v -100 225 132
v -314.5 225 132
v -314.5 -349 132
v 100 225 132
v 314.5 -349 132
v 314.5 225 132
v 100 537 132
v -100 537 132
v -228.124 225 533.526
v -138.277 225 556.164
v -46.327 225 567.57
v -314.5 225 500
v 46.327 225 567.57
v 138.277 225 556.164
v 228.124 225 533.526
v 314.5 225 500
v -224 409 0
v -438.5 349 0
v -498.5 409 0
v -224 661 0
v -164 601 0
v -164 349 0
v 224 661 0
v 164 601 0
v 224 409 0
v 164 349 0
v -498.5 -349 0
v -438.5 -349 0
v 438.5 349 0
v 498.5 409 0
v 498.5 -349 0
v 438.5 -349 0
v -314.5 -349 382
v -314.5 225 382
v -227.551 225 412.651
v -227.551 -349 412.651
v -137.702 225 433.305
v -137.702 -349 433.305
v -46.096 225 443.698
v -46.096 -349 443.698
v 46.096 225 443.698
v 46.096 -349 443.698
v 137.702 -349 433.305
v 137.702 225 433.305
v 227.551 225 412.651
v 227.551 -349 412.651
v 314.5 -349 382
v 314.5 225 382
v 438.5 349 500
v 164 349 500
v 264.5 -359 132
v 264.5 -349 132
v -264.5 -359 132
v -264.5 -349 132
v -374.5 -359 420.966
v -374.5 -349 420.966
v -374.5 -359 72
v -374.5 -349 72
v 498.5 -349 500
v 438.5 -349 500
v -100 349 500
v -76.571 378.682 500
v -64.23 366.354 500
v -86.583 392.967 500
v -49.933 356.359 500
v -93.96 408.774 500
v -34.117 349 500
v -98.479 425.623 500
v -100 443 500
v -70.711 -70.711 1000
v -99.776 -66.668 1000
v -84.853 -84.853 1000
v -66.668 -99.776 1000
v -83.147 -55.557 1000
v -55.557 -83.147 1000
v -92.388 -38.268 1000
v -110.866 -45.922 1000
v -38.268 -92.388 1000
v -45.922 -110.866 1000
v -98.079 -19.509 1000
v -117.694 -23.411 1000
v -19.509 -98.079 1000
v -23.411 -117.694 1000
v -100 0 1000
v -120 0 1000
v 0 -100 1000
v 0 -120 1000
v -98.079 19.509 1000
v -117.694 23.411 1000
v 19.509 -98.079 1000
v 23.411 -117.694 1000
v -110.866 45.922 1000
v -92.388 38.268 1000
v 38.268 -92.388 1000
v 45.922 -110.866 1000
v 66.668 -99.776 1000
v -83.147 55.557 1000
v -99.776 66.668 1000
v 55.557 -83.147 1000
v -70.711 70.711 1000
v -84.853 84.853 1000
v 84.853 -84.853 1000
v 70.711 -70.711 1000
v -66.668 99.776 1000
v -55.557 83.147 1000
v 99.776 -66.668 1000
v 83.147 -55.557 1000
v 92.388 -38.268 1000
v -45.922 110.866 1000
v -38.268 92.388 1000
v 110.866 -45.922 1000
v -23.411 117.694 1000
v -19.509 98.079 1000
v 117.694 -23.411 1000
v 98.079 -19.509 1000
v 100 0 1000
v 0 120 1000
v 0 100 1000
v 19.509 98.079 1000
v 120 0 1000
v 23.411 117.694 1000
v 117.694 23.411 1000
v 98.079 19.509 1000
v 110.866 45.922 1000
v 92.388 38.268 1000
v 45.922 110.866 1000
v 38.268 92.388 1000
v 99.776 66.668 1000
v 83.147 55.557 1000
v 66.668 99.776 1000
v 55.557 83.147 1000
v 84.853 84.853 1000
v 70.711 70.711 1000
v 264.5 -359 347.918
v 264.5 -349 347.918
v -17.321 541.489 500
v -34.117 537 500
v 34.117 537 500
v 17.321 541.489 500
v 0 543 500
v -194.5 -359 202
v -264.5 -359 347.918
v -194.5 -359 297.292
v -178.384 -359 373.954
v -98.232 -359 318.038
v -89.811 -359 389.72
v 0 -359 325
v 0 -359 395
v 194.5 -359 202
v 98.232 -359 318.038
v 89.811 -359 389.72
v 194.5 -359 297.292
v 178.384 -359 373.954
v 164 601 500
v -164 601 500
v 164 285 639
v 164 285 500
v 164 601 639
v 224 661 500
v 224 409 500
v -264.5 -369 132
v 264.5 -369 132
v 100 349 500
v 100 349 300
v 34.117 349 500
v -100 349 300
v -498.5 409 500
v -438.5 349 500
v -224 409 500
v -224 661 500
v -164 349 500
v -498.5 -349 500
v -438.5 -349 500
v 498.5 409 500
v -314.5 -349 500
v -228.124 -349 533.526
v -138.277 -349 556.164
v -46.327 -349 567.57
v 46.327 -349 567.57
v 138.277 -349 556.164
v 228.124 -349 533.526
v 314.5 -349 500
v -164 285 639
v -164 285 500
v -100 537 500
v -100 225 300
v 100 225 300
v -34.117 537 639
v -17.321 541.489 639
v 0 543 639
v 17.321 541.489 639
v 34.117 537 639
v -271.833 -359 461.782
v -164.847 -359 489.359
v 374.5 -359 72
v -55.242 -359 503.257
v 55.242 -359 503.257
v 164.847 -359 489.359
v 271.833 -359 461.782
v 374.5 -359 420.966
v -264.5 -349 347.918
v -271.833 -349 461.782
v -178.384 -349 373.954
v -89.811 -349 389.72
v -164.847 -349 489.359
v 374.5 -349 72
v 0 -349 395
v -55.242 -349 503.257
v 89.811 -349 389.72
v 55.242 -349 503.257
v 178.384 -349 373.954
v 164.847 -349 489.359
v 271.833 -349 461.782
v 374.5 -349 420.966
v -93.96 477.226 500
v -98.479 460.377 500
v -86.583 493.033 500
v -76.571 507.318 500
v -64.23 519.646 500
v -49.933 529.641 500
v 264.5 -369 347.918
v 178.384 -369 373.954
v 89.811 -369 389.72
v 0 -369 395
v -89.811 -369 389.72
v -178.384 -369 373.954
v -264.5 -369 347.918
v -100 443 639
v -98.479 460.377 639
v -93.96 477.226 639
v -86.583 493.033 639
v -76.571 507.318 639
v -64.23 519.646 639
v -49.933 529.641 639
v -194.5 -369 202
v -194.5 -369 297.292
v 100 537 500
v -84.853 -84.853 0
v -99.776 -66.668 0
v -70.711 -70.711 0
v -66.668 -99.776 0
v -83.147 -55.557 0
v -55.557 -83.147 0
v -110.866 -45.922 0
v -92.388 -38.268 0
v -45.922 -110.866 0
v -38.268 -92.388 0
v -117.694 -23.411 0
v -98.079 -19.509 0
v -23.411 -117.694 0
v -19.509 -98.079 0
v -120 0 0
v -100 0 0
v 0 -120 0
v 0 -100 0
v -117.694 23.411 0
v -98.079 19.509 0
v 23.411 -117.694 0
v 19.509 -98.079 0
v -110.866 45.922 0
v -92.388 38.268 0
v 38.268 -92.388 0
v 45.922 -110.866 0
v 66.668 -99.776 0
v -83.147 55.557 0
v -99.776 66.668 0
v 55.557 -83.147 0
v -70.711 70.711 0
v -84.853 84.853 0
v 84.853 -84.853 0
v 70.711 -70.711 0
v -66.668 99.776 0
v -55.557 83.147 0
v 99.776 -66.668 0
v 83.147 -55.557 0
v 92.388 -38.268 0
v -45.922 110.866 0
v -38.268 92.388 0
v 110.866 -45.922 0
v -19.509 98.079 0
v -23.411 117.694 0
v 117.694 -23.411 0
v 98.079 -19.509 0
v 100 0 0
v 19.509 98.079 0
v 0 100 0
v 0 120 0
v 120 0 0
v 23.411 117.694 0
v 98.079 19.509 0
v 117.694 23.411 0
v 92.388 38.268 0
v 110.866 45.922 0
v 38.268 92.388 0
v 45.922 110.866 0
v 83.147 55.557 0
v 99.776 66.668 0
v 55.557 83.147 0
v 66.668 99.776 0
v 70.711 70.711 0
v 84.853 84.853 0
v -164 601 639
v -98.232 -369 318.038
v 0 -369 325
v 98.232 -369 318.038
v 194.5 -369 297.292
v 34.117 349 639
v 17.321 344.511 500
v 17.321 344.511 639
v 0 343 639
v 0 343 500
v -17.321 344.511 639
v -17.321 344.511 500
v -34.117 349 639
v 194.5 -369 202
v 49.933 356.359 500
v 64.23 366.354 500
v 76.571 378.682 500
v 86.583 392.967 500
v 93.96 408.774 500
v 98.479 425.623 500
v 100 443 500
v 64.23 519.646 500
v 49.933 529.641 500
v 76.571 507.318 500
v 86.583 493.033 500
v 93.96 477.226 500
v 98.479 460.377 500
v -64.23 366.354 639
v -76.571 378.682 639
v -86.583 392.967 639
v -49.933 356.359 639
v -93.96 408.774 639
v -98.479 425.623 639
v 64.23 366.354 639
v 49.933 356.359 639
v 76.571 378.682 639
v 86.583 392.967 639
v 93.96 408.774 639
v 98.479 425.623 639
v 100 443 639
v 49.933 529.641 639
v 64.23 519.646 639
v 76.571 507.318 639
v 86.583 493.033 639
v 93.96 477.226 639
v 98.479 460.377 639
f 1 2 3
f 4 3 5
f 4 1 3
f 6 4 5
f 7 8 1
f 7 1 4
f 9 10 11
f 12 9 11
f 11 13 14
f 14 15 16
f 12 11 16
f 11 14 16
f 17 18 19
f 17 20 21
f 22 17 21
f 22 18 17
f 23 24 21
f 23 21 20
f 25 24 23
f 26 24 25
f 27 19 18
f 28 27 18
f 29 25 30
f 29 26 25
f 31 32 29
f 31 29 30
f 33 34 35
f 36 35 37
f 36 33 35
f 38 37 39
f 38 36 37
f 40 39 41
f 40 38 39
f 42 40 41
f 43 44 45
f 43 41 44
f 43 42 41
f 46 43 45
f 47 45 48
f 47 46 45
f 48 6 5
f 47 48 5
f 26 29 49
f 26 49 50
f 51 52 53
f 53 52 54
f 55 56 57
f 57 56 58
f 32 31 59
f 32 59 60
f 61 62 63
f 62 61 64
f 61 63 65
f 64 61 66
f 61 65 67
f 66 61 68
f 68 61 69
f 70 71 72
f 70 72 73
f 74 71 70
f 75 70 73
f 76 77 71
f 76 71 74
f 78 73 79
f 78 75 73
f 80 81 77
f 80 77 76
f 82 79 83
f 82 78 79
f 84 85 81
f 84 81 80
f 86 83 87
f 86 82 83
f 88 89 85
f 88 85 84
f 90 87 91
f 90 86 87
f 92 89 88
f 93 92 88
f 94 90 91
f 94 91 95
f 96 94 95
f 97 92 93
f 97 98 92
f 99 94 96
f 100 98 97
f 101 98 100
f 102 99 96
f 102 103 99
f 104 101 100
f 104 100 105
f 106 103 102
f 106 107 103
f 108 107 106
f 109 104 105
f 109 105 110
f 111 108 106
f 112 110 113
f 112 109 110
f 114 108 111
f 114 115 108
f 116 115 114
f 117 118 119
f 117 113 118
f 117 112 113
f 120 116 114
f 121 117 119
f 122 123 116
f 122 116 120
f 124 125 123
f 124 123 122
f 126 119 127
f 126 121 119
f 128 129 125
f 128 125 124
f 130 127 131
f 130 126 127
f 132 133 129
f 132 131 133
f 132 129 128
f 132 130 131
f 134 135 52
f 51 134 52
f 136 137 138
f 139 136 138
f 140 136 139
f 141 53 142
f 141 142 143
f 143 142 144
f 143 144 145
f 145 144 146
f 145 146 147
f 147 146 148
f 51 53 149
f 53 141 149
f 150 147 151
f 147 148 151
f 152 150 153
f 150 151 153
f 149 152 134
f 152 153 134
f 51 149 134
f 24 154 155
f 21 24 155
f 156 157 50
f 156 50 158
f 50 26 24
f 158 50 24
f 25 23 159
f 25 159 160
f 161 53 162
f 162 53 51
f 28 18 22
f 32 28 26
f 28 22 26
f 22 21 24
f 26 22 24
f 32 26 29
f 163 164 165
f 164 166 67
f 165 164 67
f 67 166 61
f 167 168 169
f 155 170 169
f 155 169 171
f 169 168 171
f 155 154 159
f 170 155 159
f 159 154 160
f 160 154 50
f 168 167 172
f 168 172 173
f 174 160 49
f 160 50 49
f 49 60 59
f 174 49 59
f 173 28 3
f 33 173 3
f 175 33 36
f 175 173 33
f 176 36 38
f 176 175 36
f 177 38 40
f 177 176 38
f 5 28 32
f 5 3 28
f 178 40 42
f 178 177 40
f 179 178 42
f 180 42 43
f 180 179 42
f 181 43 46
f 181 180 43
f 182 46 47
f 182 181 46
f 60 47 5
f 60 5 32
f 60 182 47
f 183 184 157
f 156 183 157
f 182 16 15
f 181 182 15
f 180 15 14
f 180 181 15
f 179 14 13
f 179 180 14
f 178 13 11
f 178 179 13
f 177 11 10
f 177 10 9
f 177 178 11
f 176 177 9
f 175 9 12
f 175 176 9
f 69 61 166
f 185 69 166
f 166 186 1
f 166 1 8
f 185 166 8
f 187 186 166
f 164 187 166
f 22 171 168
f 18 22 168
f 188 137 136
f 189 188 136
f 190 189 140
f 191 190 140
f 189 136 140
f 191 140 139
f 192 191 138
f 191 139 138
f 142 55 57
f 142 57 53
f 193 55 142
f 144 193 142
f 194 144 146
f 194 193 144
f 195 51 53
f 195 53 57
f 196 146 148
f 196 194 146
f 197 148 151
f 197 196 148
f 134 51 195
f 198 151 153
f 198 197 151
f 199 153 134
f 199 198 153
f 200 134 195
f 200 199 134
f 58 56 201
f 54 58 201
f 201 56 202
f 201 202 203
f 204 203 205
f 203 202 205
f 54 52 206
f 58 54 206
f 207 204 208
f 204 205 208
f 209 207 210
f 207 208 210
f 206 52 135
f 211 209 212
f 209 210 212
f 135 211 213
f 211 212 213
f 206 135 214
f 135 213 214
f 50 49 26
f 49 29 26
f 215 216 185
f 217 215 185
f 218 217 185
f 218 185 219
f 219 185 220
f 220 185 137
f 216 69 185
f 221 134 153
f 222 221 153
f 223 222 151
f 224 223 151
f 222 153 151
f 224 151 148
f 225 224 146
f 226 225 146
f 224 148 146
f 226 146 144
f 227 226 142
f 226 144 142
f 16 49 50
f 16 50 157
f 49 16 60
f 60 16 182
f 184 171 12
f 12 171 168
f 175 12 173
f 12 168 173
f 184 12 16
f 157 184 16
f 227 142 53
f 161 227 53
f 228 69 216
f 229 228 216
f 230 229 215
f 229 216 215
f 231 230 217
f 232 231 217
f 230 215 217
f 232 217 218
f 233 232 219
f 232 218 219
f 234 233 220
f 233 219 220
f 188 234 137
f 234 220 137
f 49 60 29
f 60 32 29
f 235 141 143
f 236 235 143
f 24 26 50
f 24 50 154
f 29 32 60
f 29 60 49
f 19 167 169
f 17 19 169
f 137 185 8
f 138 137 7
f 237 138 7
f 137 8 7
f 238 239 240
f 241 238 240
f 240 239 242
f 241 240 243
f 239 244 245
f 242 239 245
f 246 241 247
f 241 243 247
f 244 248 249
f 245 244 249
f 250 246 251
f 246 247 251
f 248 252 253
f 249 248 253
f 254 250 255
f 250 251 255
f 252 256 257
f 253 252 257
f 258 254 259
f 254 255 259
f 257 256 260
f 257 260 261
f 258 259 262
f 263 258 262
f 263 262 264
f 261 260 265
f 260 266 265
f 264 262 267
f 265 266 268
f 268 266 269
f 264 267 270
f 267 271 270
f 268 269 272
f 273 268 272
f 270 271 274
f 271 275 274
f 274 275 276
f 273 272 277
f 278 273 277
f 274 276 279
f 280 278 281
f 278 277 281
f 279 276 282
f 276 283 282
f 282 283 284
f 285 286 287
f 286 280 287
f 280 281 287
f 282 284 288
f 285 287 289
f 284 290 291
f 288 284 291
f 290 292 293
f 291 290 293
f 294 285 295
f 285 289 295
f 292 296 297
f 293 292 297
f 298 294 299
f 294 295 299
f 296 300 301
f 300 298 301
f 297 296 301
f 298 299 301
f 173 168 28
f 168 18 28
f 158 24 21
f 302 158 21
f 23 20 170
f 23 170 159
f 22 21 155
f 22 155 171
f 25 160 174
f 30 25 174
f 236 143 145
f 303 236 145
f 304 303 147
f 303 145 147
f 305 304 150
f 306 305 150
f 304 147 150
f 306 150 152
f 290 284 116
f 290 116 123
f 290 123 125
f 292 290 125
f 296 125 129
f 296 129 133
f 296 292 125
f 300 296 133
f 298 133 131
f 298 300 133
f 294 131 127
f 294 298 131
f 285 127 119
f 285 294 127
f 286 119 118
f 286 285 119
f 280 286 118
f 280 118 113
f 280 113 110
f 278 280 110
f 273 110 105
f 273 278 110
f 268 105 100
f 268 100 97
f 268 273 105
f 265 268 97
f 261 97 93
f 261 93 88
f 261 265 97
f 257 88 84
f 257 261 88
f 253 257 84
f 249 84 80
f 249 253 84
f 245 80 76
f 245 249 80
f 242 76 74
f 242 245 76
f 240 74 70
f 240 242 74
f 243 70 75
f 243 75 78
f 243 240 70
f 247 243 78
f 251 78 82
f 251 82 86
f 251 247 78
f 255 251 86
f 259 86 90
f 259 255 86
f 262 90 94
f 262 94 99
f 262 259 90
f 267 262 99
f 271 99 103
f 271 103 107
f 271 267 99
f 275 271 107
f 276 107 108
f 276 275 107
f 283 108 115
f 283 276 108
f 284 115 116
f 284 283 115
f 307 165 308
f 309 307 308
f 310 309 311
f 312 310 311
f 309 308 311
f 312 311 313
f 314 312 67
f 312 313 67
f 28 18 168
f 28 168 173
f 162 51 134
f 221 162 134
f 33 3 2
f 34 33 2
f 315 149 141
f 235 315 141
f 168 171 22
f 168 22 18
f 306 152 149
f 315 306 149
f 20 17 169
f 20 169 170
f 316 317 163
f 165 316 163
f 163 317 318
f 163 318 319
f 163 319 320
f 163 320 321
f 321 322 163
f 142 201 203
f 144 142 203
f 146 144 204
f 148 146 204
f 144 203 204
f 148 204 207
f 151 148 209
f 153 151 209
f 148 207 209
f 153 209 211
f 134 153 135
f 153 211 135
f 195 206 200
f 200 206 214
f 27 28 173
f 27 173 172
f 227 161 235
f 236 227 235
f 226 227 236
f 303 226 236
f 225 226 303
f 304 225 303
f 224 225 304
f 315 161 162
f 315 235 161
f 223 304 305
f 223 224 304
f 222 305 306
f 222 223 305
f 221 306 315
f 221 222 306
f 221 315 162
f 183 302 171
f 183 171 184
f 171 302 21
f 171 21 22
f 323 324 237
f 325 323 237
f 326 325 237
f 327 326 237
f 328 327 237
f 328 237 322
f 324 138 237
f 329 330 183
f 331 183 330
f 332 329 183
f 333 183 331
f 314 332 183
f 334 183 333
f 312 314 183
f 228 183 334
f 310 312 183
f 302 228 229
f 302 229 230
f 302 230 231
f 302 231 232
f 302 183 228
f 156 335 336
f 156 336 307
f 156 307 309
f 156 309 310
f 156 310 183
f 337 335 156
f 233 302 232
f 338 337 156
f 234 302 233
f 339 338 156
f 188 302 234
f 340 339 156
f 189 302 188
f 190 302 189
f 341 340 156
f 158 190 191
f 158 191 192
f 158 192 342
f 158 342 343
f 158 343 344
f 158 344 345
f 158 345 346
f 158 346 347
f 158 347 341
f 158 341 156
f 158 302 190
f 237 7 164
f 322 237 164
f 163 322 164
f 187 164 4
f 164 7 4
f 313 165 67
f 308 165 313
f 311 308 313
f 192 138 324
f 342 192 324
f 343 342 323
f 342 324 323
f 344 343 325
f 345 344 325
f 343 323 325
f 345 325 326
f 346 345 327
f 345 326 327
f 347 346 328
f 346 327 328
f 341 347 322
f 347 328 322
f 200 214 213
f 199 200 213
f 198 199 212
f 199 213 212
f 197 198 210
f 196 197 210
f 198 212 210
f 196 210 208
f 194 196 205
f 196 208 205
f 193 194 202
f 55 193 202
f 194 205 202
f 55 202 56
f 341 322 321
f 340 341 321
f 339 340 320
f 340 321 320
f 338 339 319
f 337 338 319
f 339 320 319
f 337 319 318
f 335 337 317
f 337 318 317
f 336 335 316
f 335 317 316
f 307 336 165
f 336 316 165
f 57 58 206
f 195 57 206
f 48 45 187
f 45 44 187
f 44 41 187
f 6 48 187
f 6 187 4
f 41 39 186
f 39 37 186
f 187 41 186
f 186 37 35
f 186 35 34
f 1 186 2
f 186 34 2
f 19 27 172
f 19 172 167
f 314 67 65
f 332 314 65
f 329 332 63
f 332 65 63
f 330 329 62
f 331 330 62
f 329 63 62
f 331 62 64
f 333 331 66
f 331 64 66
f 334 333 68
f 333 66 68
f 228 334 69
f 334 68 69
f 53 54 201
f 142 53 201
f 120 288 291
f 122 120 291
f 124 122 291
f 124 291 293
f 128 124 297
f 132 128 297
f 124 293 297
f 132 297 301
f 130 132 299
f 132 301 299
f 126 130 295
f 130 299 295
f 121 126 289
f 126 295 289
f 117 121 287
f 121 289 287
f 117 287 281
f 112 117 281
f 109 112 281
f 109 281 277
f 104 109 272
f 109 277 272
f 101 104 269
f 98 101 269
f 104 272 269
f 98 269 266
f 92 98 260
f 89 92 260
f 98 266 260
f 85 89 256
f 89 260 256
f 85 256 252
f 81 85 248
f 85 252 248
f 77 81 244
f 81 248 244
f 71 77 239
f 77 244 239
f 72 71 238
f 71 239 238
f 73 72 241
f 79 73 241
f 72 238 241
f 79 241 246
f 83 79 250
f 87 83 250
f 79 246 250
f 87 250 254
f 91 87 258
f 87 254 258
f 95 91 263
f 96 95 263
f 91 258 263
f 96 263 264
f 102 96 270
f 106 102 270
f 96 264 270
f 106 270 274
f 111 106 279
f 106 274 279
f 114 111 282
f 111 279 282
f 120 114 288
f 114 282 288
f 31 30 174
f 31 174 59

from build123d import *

# Parameters (mm, degrees)
F1_DEPTH  = 132
F3_DEPTH  = 368
F5_DEPTH  = 574
F7_DEPTH  = 200
F9_DEPTH  = 139
F10_R     = 120
F10_R_2   = 100
F11_DEPTH = 1000
F13_DEPTH = 500
F15_DEPTH = 10
F17_DEPTH = 10


with BuildPart() as f1:
    # F0 (on Top) → F1 (new body)
    with BuildSketch(Plane.XY):
        Polygon((-438.5, -349), (438.5, -349), (438.5, 349), (164, 349), (164, 601), (-164, 601), (-164, 349), (-438.5, 349), align=None)
    extrude(amount=F1_DEPTH)

    # F2 (on face) → F3 (join)
    with BuildSketch(Plane.XY.offset(132)):
        Polygon((314.5, 225), (314.5, -349), (438.5, -349), (438.5, 349), (164, 349), (164, 601), (-164, 601), (-164, 349), (-438.5, 349), (-438.5, -349), (-314.5, -349), (-314.5, 225), (-100, 225), (-100, 537), (100, 537), (100, 225), align=None)
    extrude(amount=F3_DEPTH)

    # F4 (on face) → F5 (join, through all)
    with BuildSketch(Plane.XZ.offset(349)):
        with BuildLine():
            ThreePointArc((-314.5, 382), (0, 445), (314.5, 382))
            Line((314.5, 382), (314.5, 500))
            ThreePointArc((314.5, 500), (0, 569), (-314.5, 500))
            Line((-314.5, 500), (-314.5, 382))
        make_face()
    extrude(amount=-F5_DEPTH)

    # F6 (on face) → F7 (join, through all)
    with BuildSketch(Plane.YZ.offset(-100)):
        Polygon((349, 500), (225, 500), (225, 438.8531788005), (225, 300), (349, 300), align=None)
    extrude(amount=F7_DEPTH)

    # F8 (on face) → F9 (join)
    with BuildSketch(Plane.XY.offset(500)):
        Polygon((164, 601), (-164, 601), (-164, 349), (-164, 285), (164, 285), (164, 349), align=None)
        with BuildLine():
            Line((100, 537), (100, 443))
            Line((100, 443), (100, 349))
            Line((100, 349), (34.1174442185, 349))
            ThreePointArc((34.1174442185, 349), (0, 343), (-34.1174442185, 349))
            Line((-34.1174442185, 349), (-100, 349))
            Line((-100, 349), (-100, 443))
            Line((-100, 443), (-100, 537))
            Line((-100, 537), (-34.1174442185, 537))
            ThreePointArc((-34.1174442185, 537), (0, 543), (34.1174442185, 537))
            Line((34.1174442185, 537), (100, 537))
        make_face(mode=Mode.SUBTRACT)
        with BuildLine():
            ThreePointArc((-100, 443), (-81.8893900998, 500.394492672), (-34.1174442185, 537))
            Line((-34.1174442185, 537), (-100, 537))
            Line((-100, 537), (-100, 443))
        make_face()
        with BuildLine():
            Line((100, 349), (100, 443))
            ThreePointArc((100, 443), (81.8893900998, 385.605507328), (34.1174442185, 349))
            Line((34.1174442185, 349), (100, 349))
        make_face()
        with BuildLine():
            ThreePointArc((34.1174442185, 537), (81.8893900998, 500.394492672), (100, 443))
            Line((100, 443), (100, 537))
            Line((100, 537), (34.1174442185, 537))
        make_face()
        with BuildLine():
            Line((-100, 349), (-34.1174442185, 349))
            ThreePointArc((-34.1174442185, 349), (-81.8893900998, 385.605507328), (-100, 443))
            Line((-100, 443), (-100, 349))
        make_face()
    extrude(amount=F9_DEPTH)


with BuildPart() as f11:
    # F10 (on Top) → F11 (new body)
    with BuildSketch(Plane.XY):
        Circle(F10_R)
        Circle(F10_R_2, mode=Mode.SUBTRACT)
    extrude(amount=F11_DEPTH)


with BuildPart() as f13:
    # F12 (on face) → F13 (new body)
    with BuildSketch(Plane(origin=(0, 0, 0), x_dir=(1, 0, 0), z_dir=(0, 0, -1))):
        Polygon((498.5, -409), (498.5, 349), (438.5, 349), (438.5, -349), (164, -349), (164, -601), (-164, -601), (-164, -349), (-438.5, -349), (-438.5, 349), (-498.5, 349), (-498.5, -409), (-224, -409), (-224, -661), (224, -661), (224, -409), align=None)
    extrude(amount=-F13_DEPTH)


with BuildPart() as f15:
    # F14 (on face) → F15 (new body)
    with BuildSketch(Plane.XZ.offset(349)):
        with BuildLine():
            Line((374.5, 72), (374.5, 420.9659825307))
            ThreePointArc((374.5, 420.9659825307), (0, 505), (-374.5, 420.9659825307))
            Line((-374.5, 420.9659825307), (-374.5, 72))
            Line((-374.5, 72), (374.5, 72))
        make_face()
        with BuildLine():
            Line((264.5, 132), (-264.5, 132))
            Line((-264.5, 132), (-314.5, 132))
            Line((-314.5, 132), (-314.5, 382))
            ThreePointArc((-314.5, 382), (0, 445), (314.5, 382))
            Line((314.5, 382), (314.5, 132))
            Line((314.5, 132), (264.5, 132))
        make_face(mode=Mode.SUBTRACT)
        with BuildLine():
            Line((-264.5, 132), (-264.5, 347.9179500357))
            ThreePointArc((-264.5, 347.9179500357), (0, 395), (264.5, 347.9179500357))
            Line((264.5, 347.9179500357), (264.5, 132))
            Line((264.5, 132), (314.5, 132))
            Line((314.5, 132), (314.5, 382))
            ThreePointArc((314.5, 382), (0, 445), (-314.5, 382))
            Line((-314.5, 382), (-314.5, 132))
            Line((-314.5, 132), (-264.5, 132))
        make_face()
    extrude(amount=F15_DEPTH)


with BuildPart() as f17:
    # F16 (on face) → F17 (new body)
    with BuildSketch(Plane.XZ.offset(359)):
        with BuildLine():
            Line((-264.5, 132), (264.5, 132))
            Line((264.5, 132), (264.5, 347.9179500357))
            ThreePointArc((264.5, 347.9179500357), (0, 395), (-264.5, 347.9179500357))
            Line((-264.5, 347.9179500357), (-264.5, 132))
        make_face()
        with BuildLine():
            ThreePointArc((-194.5, 297.2915295174), (0, 325), (194.5, 297.2915295174))
            Line((194.5, 297.2915295174), (194.5, 202))
            Line((194.5, 202), (-194.5, 202))
            Line((-194.5, 202), (-194.5, 297.2915295174))
        make_face(mode=Mode.SUBTRACT)
    extrude(amount=F17_DEPTH)


solid = Compound([f1.part, f11.part, f13.part, f15.part, f17.part])
